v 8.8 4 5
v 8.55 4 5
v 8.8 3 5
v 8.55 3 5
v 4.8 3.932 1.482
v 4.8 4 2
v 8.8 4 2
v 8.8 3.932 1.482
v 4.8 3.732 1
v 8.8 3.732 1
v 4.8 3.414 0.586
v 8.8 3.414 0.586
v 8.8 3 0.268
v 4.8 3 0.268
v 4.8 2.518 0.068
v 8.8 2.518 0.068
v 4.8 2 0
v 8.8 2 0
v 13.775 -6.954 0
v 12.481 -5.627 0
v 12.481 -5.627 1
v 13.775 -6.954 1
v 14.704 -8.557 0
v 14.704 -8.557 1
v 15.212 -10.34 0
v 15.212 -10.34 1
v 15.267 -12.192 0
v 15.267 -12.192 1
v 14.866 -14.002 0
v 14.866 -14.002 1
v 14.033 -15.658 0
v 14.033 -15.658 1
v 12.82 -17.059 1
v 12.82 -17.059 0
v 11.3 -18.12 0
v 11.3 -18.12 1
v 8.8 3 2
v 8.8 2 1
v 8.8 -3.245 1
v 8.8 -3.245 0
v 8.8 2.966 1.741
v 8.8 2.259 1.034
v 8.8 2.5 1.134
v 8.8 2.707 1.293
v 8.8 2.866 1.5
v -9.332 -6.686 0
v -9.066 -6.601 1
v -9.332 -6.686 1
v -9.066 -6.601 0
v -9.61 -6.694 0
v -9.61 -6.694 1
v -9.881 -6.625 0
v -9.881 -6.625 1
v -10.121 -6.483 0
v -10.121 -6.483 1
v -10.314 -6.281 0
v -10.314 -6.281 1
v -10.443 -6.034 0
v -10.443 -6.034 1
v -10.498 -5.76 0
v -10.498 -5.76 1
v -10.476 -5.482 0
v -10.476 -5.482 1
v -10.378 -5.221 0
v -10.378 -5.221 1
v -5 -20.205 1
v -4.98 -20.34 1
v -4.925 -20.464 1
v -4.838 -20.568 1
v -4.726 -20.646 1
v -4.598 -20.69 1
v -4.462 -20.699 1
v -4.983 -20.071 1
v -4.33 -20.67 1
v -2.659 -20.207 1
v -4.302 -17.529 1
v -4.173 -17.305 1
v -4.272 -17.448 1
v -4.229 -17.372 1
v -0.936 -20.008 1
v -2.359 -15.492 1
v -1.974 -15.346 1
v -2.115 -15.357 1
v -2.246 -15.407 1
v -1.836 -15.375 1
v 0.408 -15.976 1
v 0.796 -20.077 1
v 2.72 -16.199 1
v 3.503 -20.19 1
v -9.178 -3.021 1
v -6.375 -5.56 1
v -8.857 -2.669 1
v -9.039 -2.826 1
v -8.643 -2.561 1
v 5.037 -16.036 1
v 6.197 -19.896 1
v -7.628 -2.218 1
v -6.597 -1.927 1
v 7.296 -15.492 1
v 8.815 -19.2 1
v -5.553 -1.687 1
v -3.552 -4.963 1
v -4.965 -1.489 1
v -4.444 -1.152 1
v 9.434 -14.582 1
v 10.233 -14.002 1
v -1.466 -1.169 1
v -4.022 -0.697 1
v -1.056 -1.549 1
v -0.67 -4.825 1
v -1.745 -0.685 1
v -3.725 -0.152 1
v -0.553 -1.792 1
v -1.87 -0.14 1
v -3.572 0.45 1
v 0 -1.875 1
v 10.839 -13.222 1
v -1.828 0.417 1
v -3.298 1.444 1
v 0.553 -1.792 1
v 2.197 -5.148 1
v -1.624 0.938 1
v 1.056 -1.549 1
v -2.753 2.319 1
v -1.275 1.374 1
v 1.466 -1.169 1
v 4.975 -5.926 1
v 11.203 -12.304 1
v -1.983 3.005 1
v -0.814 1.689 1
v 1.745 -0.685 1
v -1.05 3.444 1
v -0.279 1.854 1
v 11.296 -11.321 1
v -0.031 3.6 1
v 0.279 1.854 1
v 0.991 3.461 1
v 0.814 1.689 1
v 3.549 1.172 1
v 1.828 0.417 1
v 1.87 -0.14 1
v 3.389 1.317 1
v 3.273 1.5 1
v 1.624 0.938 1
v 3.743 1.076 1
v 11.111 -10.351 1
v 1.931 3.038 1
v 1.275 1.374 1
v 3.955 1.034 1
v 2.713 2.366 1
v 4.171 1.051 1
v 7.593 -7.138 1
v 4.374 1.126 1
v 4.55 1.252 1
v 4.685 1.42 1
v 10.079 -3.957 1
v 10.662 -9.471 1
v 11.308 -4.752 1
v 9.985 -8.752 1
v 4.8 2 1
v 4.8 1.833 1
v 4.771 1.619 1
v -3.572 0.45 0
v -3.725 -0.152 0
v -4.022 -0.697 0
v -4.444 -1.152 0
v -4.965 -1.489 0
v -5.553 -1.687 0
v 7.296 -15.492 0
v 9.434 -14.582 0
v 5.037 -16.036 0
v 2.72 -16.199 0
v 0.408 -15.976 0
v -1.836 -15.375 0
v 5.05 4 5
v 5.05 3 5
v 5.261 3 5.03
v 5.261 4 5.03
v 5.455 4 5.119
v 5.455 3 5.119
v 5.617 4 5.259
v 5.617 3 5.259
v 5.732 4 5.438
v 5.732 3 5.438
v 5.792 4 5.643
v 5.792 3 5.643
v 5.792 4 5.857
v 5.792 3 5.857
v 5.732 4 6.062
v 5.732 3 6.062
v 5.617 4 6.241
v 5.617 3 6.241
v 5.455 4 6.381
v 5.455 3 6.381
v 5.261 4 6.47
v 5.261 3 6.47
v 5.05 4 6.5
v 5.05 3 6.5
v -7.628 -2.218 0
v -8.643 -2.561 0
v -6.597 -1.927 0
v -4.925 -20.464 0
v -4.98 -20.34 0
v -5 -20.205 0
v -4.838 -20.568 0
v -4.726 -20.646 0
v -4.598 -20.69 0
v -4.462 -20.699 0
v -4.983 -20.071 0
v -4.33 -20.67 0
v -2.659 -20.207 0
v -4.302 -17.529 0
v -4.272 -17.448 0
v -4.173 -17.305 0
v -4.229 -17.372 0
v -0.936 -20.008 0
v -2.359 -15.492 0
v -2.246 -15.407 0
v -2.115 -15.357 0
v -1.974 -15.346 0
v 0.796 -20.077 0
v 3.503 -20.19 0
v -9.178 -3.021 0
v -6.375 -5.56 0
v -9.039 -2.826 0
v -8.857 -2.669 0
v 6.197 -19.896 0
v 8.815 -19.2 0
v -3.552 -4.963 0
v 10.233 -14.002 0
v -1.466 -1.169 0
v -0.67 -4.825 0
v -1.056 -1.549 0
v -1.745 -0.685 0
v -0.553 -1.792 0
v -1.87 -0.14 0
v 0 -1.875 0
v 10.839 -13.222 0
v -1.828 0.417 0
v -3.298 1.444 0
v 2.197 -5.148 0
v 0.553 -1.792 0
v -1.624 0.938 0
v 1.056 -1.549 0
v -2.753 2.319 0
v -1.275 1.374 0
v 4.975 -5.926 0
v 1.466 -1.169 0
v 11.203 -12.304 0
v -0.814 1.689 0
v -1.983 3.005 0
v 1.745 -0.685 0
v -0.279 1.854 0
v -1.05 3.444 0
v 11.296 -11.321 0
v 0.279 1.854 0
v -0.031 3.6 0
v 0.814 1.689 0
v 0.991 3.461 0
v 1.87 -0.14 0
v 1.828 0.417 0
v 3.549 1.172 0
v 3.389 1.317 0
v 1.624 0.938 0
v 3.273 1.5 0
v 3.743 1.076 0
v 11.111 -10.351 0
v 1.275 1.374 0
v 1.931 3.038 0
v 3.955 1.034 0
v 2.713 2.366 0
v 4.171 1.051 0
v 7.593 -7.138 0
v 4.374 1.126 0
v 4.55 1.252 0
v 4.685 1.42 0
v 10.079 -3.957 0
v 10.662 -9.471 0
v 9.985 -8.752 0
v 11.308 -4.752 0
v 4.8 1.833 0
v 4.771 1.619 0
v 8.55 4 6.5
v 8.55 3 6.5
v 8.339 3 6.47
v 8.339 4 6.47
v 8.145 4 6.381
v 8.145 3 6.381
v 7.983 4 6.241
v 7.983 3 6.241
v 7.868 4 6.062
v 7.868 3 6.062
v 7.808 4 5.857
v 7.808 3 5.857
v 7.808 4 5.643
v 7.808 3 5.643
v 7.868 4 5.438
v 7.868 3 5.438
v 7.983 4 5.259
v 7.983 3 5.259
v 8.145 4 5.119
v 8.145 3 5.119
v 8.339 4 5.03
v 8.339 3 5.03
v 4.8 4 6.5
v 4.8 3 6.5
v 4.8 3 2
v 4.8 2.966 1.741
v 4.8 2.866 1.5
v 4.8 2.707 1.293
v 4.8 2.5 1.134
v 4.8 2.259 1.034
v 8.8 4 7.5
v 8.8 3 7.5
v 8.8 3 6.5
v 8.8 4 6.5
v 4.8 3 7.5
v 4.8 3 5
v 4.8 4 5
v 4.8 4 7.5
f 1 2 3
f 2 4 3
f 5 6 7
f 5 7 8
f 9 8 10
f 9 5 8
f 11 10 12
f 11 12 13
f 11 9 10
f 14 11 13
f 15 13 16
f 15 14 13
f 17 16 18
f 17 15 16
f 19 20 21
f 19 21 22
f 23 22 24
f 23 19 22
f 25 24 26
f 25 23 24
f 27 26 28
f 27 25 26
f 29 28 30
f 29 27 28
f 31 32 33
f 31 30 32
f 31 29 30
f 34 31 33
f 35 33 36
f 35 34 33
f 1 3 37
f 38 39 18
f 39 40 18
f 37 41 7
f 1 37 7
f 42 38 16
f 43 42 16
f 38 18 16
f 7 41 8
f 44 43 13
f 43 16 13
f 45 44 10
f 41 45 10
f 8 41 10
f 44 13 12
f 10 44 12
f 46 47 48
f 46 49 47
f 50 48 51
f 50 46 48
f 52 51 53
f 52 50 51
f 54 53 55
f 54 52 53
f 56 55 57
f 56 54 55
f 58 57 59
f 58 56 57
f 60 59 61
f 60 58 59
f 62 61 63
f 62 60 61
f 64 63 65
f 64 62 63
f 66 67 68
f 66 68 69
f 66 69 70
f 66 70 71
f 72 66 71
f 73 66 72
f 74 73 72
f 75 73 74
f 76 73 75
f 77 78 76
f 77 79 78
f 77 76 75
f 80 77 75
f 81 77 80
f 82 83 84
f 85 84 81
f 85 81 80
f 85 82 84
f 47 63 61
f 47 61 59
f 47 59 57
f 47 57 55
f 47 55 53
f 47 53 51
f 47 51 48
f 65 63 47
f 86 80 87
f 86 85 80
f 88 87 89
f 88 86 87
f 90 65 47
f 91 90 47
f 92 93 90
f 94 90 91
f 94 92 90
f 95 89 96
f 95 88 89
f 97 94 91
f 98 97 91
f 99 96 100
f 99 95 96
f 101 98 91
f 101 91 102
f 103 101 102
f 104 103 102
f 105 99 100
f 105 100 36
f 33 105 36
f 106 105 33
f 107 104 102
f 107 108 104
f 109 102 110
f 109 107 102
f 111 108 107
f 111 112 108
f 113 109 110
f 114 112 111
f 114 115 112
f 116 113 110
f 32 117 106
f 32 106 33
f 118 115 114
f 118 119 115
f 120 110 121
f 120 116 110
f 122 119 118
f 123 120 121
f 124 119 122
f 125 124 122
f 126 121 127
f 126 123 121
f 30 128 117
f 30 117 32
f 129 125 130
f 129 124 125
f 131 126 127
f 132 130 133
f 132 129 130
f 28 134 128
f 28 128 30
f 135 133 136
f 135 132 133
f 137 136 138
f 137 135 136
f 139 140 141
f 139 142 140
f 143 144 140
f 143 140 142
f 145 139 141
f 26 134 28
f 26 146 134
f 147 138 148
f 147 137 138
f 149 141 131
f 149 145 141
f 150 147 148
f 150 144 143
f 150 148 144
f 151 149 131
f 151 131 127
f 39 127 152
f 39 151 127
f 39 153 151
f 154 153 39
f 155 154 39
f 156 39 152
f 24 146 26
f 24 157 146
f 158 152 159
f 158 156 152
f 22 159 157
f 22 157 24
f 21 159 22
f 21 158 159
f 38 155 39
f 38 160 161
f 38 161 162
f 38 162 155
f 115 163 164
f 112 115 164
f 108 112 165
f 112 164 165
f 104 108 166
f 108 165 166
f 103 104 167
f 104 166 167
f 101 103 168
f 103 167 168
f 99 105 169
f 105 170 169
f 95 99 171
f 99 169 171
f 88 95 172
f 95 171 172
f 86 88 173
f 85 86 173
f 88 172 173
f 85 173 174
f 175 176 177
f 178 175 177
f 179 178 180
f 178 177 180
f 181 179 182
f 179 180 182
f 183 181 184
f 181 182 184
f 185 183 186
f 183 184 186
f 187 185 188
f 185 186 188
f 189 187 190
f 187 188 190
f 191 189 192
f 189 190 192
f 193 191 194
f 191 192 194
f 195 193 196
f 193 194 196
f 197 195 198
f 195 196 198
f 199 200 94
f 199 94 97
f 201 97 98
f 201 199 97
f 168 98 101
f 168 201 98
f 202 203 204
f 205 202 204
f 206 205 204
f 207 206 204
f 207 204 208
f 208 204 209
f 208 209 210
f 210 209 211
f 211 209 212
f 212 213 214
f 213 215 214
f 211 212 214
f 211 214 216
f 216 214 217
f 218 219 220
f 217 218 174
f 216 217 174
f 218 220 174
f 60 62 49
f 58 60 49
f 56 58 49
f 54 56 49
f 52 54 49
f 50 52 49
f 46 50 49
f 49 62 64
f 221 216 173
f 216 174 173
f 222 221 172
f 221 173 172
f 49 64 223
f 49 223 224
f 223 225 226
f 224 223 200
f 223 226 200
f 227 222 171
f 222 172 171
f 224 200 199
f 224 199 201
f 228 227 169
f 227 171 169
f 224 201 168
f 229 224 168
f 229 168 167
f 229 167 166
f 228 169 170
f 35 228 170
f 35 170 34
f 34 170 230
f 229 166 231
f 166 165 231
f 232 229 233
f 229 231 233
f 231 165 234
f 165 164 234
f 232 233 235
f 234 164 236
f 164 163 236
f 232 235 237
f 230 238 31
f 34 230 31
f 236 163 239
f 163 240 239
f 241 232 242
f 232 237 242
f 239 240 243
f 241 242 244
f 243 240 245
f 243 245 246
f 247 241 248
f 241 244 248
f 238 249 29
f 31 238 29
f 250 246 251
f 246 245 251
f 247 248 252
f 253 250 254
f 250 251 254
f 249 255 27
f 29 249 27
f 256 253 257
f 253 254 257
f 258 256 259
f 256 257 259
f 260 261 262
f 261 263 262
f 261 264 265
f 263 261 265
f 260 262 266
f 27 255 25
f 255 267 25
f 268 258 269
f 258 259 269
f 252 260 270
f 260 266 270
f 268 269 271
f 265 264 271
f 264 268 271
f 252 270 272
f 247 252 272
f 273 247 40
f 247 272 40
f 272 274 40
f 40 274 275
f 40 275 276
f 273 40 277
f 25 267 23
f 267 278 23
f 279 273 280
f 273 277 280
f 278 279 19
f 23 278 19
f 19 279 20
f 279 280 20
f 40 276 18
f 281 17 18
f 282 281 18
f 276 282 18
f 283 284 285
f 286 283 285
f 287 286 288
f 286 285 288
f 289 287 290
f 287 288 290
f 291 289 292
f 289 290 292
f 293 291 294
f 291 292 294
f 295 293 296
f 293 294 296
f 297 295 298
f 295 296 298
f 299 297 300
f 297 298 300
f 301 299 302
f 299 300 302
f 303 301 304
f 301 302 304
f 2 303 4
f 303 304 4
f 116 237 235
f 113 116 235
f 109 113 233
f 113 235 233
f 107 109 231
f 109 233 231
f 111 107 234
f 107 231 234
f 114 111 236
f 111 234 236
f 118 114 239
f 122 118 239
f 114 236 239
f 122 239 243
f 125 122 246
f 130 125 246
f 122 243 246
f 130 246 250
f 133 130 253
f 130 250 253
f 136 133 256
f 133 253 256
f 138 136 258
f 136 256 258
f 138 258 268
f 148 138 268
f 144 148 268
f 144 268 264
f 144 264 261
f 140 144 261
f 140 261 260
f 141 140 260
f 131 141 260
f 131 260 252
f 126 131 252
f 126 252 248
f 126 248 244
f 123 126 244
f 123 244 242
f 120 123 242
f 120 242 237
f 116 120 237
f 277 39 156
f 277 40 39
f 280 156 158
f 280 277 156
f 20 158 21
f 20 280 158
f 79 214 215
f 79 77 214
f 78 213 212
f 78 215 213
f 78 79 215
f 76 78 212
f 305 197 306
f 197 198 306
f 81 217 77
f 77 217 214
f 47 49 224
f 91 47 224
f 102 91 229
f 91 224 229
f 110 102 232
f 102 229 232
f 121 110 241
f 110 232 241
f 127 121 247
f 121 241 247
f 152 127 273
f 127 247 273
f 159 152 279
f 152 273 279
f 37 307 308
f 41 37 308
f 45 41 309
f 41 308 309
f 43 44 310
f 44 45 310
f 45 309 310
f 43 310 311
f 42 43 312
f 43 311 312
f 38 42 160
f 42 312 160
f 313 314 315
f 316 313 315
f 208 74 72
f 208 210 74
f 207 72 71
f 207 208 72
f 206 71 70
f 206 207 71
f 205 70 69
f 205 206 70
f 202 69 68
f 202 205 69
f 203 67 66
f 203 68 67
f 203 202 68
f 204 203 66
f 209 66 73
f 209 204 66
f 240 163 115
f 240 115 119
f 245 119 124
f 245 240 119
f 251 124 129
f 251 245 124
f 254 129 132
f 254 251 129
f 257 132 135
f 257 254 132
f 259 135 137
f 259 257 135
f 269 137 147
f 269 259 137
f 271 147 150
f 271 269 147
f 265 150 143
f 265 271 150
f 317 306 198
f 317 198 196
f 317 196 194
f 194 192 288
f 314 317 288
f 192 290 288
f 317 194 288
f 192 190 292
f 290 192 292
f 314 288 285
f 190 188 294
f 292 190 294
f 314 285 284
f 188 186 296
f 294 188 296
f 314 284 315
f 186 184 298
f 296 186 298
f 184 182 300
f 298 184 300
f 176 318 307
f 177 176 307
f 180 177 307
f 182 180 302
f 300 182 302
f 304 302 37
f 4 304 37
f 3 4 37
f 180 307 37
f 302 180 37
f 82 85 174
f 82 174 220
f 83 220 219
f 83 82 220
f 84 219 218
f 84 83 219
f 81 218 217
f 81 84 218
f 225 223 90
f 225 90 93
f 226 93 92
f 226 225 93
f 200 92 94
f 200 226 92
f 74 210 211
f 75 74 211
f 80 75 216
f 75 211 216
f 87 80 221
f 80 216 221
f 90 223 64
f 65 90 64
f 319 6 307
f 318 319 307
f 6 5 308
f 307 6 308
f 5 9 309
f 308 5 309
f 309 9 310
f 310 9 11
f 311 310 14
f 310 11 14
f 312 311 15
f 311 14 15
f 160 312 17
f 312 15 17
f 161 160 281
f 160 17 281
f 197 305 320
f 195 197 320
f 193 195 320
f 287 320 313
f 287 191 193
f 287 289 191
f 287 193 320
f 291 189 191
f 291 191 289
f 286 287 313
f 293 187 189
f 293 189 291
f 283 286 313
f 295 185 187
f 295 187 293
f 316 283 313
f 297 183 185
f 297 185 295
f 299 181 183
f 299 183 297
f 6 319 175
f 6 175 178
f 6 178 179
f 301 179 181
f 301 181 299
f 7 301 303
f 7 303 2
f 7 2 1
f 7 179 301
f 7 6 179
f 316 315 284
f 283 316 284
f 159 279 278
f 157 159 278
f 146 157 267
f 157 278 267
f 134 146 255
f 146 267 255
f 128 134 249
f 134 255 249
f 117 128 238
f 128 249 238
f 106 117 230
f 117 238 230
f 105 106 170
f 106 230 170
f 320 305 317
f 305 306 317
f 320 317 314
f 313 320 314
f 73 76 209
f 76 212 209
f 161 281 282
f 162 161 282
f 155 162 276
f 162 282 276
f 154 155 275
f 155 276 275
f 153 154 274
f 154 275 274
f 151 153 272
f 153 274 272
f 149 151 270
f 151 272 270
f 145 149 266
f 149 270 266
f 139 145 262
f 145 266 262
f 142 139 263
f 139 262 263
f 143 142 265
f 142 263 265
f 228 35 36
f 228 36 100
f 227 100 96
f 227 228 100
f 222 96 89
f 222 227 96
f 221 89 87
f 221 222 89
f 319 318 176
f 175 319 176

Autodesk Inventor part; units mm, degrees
ref_plane "YZ Plane" through (0, 0, 0) normal (1, 0, 0) x (0, 1, 0)
ref_plane "XZ Plane" through (0, 0, 0) normal (0, 1, 0) x (-1, 0, 0)
ref_plane "XY Plane" through (0, 0, 0) normal (0, 0, 1) x (1, 0, 0)
sketch "Sketch1 outline for Plate1" plane through (0, 0, 0) normal (0, 0, 1) x (1, 0, 0)
  arc A0 (-4.982963, -20.07059) -> (-4.329627, -20.670078) centre (-4.5, -20.2) ccw
  arc A1 (-4.329627, -20.670078) -> (0.795926, -20.076601) centre (-0.513276, -31.19982) cw
  arc A2 (0.795926, -20.076601) -> (11.300243, -18.119671) centre (2.9, -2.2) ccw
  arc A3 (11.300243, -18.119671) -> (12.481249, -5.626677) centre (7.800142, -11.486475) ccw
  arc A4 (12.481249, -5.626677) -> (8.8, -3.245095) centre (-1.25, -22.815417) ccw
  line L0 (8.8, -3.245095) -> (8.8, 3)
  line L1 (8.8, 3) -> (4.8, 3)
  line L2 (4.8, 3) -> (4.8, 1.83303)
  arc A5 (4.8, 1.83303) -> (3.272727, 1.499752) centre (4, 1.83303) cw
  arc A6 (3.272727, 1.499752) -> (-3.571778, 0.449892) centre (0, 0) ccw
  arc A7 (-3.571778, 0.449892) -> (-5.553237, -1.687388) centre (-6.052179, 0.762317) cw
  arc A8 (-5.553237, -1.687388) -> (-8.642869, -2.560617) centre (-1.25, -22.815417) ccw
  arc A9 (-8.642869, -2.560617) -> (-9.177896, -3.021148) centre (-8.3, -3.5) ccw
  line L3 (-9.177896, -3.021148) -> (-10.377896, -5.221148)
  arc A10 (-10.377896, -5.221148) -> (-9.065789, -6.600811) centre (-9.5, -5.7) ccw
  arc A11 (-9.065789, -6.600811) -> (9.984659, -8.751902) centre (-1.25, -22.815417) cw
  arc A12 (9.984659, -8.751902) -> (9.433522, -14.581966) centre (7.800142, -11.486475) cw
  arc A13 (9.433522, -14.581966) -> (-2.131853, -15.264473) centre (2.9, -2.2) cw
  line L4 (-2.131853, -15.264473) -> (-4.26738, -17.4)
  line L5 (-4.26738, -17.4) -> (-4.982963, -20.07059)
extrude "Plate1" add sketch "Sketch1 outline for Plate1" along normal blind 1
sketch "Sketch2 outline for Plate2" plane through (4.8, 3, 0) normal (0, 1, 0) x (1, 0, 0)
  line L0 (4, -5) -> (4, 0)
  line L1 (3.75, -5) -> (4, -5)
  arc A0 (3.75, -6.5) -> (3.75, -5) centre (3.75, -5.75) cw
  line L2 (4, -6.5) -> (3.75, -6.5)
  line L3 (4, -7.5) -> (4, -6.5)
  line L4 (0, -7.5) -> (4, -7.5)
  line L5 (0, -6.5) -> (0, -7.5)
  line L6 (0.25, -6.5) -> (0, -6.5)
  arc A1 (0.25, -5) -> (0.25, -6.5) centre (0.25, -5.75) cw
  line L7 (0, -5) -> (0.25, -5)
  line L8 (0, 0) -> (0, -5)
  line L9 (4, 0) -> (0, 0)
sheet face with bend "Face2" sketch "Sketch2 outline for Plate2" thickness 1 toward (0, 1, 0) bend radius 1
bend "Bend1"
sketch "Sketch1" plane through (0, 0, 0) normal (0, 0, 1) x (1, 0, 0)
  arc A0 (3.272727, 1.499752) -> (-3.571778, 0.449892) centre (0, 0) ccw
  circle A1 centre (-8.3, -3.5) radius 1
  circle A2 centre (-9.5, -5.7) radius 1
  circle A3 centre (-4.5, -20.2) radius 0.5
  arc A4 (9.984659, -8.751902) -> (-9.065789, -6.600811) centre (-1.25, -22.815417) ccw
  line L0 (0, 0) -> (0, -25.191235) construction
  line L1 (-4.982963, -20.07059) -> (-4.26738, -17.4)
  line L2 (-4.26738, -17.4) -> (-2.131853, -15.264473)
  line L3 (-4.26738, -17.4) -> (1.767607, -17.4) construction
  arc A5 (-2.131853, -15.264473) -> (9.433522, -14.581966) centre (2.9, -2.2) ccw
  arc A6 (9.433522, -14.581966) -> (9.984659, -8.751902) centre (7.800142, -11.486475) ccw
  arc A7 (-5.553237, -1.687388) -> (-8.642869, -2.560617) centre (-1.25, -22.815417) ccw
  arc A8 (0.795926, -20.076601) -> (11.300243, -18.119671) centre (2.9, -2.2) ccw
  arc A9 (11.300243, -18.119671) -> (12.481249, -5.626677) centre (7.800142, -11.486475) ccw
  arc A10 (12.481249, -5.626677) -> (8.8, -3.245095) centre (-1.25, -22.815417) ccw
  line L4 (-10.377896, -5.221148) -> (-9.177896, -3.021148)
  arc A11 (0.795926, -20.076601) -> (-4.329627, -20.670078) centre (-0.513276, -31.19982) ccw
  arc A12 (-5.553237, -1.687388) -> (-3.571778, 0.449892) centre (-6.052179, 0.762317) ccw
  line L5 (4.8, 3) -> (8.8, 3)
  line L6 (8.8, 3) -> (8.8, -3.245095)
  arc A13 (3.272727, 1.499752) -> (4.8, 1.83303) centre (4, 1.83303) ccw
  line L7 (4.8, 3) -> (4.8, 1.83303)
  dimension "d34" = 7.2
  dimension "d35" = 2
  dimension "d36" = 8.3
  dimension "d37" = 9.5
  dimension "d38" = 3.5
  dimension "d39" = 5.7
  dimension "d40" = 1
  dimension "d41" = 20.2
  dimension "d42" = 4.5
  dimension "d43" = 1.25
  dimension "d44" = 22.81542
  dimension "d45" = 18
  dimension "d46" = 15
  dimension "d47" = 17.4
  dimension "d48" = 45
  dimension "d49" = 2.9
  dimension "d50" = 2.2
  dimension "d51" = 14
  dimension "d52" = 3.5
  dimension "d53" = 4
  dimension "d54" = 11.2
  dimension "d55" = 2.5
  dimension "d56" = 8.8
  dimension "d57" = 4
  dimension "d58" = 3
  dimension "d59" = 1.6
  dimension "d60" = 18
  dimension "d61" = 22
sketch "Sketch2" plane through (4.8, 3, 0) normal (0, 1, 0) x (1, 0, 0)
  line L0 (4, 0) -> (0, 0)
  line L1 (4, 0) -> (0, 0)
  line L2 (0, 0) -> (0, -7.5)
  line L3 (0, -7.5) -> (4, -7.5)
  line L4 (4, -7.5) -> (4, 0)
  line L5 (0, -6.5) -> (0.25, -6.5)
  arc A0 (0.25, -6.5) -> (0.25, -5) centre (0.25, -5.75) ccw
  line L6 (0.25, -5) -> (0, -5)
  line L7 (4, -6.5) -> (3.75, -6.5)
  arc A1 (3.75, -5) -> (3.75, -6.5) centre (3.75, -5.75) ccw
  line L8 (3.75, -5) -> (4, -5)
  line L9 (0, -1) -> (4, -1)
  point P0 (-4.8, 0)
  dimension "d65" = 0.75
  dimension "d66" = 3.5
  dimension "d84" = 6.5
  dimension "d85" = 4.75
hole "Hole1" at (0, 0, 1) direction (0, 0, -1) diameter 3.75 end through all
fillet "Fillet1" radius 0.5 2 edges at (-4.2674, -17.4, 0.5) (-2.1319, -15.2645, 0.5)
equation "\"d81\" = Thickness"
equation "\"d86\" = Thickness"
equation "\"d69\" = BendRadius"
equation "\"d70\" = BendReliefWidth"
equation "\"d72\" = MinimumRemnant"
equation "\"d71\" = BendReliefDepth"
equation "\"d73\" = BendRadius"
equation "\"BendRadius\" = Thickness"
equation "\"BendReliefWidth\" = Thickness"
equation "\"BendReliefDepth\" = 0.5 * Thickness"
equation "\"CornerReliefSize\" = 4 * Thickness"
equation "\"MinimumRemnant\" = 2 * Thickness"
equation "\"TransitionRadius\" = BendRadius"
equation "\"JacobiRadiusSize\" = BendRadius"
equation "\"GapSize\" = Thickness"
equation "\"d62\" = BendRadius"
equation "\"Thickness\" = 1"
properties part number "403-08" material "Aluminum-6061"
